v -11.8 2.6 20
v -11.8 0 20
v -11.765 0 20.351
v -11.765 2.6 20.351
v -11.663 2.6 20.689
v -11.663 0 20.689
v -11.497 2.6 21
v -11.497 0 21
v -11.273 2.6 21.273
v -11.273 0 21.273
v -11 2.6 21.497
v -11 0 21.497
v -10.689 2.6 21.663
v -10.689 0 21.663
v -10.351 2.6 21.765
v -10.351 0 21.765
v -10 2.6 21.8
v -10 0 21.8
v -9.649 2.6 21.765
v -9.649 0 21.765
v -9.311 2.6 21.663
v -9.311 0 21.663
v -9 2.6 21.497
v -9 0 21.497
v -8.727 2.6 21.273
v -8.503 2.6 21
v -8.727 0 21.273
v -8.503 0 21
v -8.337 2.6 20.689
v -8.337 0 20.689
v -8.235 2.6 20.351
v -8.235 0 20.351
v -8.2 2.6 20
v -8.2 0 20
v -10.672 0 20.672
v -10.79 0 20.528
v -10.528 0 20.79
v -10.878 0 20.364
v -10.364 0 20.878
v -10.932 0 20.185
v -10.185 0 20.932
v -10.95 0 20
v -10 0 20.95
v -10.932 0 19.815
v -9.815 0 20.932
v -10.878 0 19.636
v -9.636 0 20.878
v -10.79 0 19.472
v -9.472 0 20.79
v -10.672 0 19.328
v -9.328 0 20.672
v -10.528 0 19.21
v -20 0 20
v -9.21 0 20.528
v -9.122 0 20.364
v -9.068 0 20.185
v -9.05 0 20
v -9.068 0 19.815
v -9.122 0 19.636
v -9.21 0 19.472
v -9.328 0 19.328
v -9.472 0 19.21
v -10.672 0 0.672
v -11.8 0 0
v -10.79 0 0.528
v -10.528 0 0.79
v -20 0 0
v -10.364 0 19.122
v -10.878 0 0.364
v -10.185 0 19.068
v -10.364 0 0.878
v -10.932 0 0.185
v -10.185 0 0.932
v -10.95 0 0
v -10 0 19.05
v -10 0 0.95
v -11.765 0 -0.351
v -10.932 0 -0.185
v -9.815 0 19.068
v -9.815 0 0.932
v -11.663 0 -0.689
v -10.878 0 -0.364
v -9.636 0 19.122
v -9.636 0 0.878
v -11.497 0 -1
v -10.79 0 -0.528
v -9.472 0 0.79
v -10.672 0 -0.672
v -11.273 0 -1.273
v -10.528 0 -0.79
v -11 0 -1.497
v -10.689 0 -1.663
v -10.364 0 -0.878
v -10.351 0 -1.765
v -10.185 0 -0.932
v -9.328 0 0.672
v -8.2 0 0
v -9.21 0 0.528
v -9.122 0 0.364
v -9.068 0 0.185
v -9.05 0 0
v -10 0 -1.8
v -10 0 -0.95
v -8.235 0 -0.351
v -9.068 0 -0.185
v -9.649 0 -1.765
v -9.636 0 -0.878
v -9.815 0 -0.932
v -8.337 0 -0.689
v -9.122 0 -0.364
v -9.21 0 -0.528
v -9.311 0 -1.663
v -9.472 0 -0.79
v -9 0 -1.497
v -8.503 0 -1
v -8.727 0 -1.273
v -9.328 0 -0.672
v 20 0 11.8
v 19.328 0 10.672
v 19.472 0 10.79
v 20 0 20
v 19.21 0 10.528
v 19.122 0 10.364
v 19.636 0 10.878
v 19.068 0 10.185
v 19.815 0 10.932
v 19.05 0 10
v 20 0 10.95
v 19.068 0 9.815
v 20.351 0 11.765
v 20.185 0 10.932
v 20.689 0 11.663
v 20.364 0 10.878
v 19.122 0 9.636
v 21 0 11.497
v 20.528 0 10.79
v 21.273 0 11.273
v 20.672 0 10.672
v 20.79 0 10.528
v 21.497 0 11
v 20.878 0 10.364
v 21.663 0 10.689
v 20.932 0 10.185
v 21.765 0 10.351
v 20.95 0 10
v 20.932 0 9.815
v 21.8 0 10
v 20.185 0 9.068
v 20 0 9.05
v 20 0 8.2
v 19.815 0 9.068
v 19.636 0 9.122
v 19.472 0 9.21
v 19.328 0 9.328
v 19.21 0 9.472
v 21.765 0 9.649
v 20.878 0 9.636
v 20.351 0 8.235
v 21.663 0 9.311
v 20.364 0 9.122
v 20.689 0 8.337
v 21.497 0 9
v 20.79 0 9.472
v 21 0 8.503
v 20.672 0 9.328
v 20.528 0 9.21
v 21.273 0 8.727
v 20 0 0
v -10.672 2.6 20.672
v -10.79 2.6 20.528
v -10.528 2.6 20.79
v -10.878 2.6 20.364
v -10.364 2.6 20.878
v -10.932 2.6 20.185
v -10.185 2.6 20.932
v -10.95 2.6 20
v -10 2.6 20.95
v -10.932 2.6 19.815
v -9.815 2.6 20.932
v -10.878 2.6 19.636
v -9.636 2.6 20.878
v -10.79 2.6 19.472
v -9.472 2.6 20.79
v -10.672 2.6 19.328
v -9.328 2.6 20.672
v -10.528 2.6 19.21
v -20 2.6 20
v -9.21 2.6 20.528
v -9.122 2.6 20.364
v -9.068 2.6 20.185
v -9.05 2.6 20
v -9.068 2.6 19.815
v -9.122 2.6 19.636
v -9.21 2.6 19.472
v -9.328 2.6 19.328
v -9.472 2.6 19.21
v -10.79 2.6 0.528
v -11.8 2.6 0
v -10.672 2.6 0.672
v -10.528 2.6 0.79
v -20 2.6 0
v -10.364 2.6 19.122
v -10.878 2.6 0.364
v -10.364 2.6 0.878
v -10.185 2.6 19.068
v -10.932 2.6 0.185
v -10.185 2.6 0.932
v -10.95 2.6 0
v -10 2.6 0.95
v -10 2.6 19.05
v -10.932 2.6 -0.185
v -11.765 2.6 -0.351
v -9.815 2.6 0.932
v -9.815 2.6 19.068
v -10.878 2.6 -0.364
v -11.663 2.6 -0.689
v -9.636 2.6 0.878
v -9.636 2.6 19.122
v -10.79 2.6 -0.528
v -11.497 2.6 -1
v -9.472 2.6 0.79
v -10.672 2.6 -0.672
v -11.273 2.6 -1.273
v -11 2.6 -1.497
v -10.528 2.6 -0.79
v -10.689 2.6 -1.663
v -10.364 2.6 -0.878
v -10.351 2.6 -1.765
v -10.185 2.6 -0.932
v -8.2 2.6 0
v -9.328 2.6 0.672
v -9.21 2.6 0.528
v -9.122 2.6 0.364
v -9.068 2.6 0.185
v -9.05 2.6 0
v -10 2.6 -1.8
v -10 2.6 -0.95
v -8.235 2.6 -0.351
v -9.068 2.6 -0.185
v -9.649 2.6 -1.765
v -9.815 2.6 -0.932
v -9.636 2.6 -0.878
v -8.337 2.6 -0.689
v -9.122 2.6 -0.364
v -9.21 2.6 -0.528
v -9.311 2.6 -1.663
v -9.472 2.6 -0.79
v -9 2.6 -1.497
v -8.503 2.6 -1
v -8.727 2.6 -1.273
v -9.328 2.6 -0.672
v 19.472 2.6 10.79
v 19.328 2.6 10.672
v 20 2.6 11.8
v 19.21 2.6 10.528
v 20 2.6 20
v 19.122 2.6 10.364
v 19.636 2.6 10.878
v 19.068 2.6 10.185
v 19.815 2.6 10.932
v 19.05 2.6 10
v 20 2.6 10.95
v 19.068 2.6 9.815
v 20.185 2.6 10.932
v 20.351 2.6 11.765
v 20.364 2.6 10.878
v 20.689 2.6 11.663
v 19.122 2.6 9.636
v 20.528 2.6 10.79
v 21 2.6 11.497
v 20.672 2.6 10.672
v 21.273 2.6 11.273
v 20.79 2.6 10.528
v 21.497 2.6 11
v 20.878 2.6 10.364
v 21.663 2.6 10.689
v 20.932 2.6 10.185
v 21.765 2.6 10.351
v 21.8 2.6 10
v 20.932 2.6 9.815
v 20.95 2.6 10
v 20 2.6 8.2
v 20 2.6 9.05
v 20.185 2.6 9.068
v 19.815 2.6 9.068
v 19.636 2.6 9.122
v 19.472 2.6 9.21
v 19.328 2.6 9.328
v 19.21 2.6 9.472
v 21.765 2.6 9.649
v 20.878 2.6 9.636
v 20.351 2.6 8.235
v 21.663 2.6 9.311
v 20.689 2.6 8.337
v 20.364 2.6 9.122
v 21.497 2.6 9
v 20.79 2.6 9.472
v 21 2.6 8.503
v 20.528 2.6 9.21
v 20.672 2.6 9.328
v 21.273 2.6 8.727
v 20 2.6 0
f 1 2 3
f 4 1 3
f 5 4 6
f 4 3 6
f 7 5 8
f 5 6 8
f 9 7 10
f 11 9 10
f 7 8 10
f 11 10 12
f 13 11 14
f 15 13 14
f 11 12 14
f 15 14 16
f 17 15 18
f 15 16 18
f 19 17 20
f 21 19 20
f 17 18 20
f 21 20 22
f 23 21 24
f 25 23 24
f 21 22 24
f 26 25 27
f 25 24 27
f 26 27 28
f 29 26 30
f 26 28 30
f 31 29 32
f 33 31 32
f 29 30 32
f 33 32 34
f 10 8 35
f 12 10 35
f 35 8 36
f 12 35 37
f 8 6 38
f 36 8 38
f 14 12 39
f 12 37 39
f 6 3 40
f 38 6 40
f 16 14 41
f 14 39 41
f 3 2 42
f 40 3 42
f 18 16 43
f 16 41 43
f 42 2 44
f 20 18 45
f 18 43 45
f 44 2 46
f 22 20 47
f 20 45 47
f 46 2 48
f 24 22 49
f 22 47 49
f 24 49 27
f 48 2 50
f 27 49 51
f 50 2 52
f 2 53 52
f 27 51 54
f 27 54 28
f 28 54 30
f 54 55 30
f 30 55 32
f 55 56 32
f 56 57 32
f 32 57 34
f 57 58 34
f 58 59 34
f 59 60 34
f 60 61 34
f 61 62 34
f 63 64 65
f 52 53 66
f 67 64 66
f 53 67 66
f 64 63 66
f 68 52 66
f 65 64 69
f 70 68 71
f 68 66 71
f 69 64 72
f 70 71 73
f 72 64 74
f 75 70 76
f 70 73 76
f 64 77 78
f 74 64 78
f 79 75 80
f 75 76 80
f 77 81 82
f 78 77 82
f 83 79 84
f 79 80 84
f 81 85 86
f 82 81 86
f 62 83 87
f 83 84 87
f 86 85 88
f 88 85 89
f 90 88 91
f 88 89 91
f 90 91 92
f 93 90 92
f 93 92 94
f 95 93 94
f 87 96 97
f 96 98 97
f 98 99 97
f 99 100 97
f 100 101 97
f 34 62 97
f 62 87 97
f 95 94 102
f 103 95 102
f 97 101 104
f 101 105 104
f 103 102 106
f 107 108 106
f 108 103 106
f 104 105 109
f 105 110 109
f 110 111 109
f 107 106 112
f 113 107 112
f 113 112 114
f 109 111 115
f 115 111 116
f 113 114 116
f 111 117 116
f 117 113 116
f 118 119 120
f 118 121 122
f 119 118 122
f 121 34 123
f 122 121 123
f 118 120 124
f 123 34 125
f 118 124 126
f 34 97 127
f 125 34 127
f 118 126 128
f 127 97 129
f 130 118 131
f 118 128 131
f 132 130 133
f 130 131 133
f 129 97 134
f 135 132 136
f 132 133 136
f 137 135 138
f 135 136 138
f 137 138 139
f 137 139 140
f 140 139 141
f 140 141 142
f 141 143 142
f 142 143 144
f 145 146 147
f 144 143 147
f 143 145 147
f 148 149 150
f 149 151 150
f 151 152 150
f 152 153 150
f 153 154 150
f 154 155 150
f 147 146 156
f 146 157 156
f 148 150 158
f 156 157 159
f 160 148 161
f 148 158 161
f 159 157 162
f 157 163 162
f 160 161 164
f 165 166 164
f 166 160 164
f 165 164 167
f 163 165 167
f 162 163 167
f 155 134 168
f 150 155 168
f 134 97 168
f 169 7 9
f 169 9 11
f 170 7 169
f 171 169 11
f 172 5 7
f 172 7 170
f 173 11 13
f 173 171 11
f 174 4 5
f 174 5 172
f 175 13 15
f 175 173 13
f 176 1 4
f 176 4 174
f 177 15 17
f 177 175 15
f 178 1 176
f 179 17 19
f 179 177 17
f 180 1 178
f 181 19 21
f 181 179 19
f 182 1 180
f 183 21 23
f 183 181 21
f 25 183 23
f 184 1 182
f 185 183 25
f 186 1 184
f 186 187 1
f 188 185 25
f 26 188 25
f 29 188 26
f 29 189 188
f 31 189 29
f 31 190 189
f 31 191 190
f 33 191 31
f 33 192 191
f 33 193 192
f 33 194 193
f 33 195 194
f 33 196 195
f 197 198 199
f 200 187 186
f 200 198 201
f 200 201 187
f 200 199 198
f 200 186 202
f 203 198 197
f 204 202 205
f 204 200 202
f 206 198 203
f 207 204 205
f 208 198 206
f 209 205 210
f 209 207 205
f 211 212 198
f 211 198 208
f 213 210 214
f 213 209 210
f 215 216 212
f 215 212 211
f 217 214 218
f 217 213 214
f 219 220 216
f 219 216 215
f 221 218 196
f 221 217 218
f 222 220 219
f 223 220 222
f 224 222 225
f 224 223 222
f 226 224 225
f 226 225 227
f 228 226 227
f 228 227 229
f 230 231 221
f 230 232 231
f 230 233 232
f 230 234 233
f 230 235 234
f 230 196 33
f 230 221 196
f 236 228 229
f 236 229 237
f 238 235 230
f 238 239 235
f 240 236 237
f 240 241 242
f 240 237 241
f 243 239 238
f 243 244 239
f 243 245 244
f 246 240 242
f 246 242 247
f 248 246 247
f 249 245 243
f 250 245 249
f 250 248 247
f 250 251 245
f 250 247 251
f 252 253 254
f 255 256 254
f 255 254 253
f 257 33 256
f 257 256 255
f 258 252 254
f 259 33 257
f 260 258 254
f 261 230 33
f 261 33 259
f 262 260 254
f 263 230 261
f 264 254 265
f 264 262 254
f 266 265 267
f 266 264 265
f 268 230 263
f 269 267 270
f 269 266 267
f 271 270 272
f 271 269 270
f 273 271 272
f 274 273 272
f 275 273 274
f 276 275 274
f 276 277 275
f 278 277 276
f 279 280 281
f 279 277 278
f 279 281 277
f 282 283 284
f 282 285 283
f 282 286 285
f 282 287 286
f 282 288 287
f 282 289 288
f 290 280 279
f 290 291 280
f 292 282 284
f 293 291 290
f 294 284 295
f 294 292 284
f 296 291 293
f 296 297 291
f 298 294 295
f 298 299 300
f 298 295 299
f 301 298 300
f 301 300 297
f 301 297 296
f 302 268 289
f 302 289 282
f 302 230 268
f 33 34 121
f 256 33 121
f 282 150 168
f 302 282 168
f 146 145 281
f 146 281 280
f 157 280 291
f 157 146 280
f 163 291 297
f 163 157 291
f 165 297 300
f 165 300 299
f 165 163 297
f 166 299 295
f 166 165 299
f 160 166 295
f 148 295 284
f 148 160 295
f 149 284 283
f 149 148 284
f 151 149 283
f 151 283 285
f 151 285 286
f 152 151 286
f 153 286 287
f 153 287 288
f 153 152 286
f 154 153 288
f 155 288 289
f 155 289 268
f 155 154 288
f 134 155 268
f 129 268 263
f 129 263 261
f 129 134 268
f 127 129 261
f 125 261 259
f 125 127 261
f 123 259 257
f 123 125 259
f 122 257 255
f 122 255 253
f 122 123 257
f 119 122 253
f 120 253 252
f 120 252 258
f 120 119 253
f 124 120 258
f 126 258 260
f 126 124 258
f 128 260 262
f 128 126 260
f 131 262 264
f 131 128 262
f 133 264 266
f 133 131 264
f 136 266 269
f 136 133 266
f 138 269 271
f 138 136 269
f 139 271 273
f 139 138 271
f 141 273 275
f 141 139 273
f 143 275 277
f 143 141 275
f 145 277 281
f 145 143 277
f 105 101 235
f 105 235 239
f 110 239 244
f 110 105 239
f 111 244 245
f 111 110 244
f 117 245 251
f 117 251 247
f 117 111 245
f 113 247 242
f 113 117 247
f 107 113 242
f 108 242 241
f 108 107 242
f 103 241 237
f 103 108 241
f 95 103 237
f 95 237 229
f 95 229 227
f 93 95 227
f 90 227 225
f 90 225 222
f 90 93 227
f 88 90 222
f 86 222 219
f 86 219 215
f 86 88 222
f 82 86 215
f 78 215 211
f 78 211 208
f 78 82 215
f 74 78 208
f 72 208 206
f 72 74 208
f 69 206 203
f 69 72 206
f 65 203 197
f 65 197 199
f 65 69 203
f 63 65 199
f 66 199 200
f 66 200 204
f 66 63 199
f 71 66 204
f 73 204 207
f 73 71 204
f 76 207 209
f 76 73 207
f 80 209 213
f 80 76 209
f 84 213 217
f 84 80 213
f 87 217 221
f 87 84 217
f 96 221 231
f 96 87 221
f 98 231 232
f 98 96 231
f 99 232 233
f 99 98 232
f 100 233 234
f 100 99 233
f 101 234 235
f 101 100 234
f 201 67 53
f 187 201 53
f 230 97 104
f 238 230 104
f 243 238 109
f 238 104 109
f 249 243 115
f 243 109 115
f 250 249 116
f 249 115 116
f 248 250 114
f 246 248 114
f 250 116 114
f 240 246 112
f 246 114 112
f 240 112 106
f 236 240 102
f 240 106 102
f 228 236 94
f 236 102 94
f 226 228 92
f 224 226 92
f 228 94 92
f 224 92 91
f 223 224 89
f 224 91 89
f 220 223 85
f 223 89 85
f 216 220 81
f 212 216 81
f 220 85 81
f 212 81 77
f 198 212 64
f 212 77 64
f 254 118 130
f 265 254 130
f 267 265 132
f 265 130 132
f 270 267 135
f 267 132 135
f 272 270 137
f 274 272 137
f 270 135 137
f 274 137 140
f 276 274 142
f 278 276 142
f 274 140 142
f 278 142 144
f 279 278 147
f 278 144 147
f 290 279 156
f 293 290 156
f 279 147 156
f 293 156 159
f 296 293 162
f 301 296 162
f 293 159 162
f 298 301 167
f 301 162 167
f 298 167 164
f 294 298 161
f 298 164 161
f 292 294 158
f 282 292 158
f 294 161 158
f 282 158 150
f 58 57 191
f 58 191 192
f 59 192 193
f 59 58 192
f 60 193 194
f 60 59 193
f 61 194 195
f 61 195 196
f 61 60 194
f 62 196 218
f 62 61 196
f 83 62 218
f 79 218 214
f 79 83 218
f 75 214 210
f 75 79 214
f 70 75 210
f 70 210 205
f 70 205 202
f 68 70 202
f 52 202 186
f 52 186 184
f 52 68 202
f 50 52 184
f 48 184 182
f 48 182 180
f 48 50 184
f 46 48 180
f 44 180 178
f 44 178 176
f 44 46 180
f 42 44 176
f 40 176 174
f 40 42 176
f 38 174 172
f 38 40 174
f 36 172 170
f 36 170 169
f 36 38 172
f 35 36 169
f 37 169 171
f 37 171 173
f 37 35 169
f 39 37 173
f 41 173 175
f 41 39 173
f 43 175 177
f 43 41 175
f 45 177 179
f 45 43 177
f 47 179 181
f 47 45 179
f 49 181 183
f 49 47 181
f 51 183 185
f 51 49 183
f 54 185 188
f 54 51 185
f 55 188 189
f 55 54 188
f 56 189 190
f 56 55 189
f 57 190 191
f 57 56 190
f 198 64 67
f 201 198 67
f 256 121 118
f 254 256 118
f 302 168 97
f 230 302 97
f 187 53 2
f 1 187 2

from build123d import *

# Parameters (mm, degrees)
SKETCH1_R           = 0.95
BOSS_EXTRUDE1_DEPTH = 2.6


with BuildPart() as part:
    # Sketch1 → Boss-Extrude1 (new body)
    with BuildSketch(Plane(origin=(0, 0, 0), x_dir=(1, 0, 0), z_dir=(0, 1, 0))):
        with BuildLine():
            Line((20, -8.2), (20, 0))
            Line((20, 0), (-8.2, 0))
            ThreePointArc((-8.2, 0), (-10, 1.8), (-11.8, 0))
            Line((-11.8, 0), (-20, 0))
            Line((-20, 0), (-20, -20))
            Line((-20, -20), (-11.8, -20))
            ThreePointArc((-11.8, -20), (-10, -21.8), (-8.2, -20))
            Line((-8.2, -20), (20, -20))
            Line((20, -20), (20, -11.8))
            ThreePointArc((20, -11.8), (21.8, -10), (20, -8.2))
        make_face()
        with Locations((-10, 0)):
            Circle(SKETCH1_R, mode=Mode.SUBTRACT)
        with Locations((20, -10)):
            Circle(SKETCH1_R, mode=Mode.SUBTRACT)
        with Locations((-10, -20)):
            Circle(SKETCH1_R, mode=Mode.SUBTRACT)
    extrude(amount=BOSS_EXTRUDE1_DEPTH)


solid = part.part
